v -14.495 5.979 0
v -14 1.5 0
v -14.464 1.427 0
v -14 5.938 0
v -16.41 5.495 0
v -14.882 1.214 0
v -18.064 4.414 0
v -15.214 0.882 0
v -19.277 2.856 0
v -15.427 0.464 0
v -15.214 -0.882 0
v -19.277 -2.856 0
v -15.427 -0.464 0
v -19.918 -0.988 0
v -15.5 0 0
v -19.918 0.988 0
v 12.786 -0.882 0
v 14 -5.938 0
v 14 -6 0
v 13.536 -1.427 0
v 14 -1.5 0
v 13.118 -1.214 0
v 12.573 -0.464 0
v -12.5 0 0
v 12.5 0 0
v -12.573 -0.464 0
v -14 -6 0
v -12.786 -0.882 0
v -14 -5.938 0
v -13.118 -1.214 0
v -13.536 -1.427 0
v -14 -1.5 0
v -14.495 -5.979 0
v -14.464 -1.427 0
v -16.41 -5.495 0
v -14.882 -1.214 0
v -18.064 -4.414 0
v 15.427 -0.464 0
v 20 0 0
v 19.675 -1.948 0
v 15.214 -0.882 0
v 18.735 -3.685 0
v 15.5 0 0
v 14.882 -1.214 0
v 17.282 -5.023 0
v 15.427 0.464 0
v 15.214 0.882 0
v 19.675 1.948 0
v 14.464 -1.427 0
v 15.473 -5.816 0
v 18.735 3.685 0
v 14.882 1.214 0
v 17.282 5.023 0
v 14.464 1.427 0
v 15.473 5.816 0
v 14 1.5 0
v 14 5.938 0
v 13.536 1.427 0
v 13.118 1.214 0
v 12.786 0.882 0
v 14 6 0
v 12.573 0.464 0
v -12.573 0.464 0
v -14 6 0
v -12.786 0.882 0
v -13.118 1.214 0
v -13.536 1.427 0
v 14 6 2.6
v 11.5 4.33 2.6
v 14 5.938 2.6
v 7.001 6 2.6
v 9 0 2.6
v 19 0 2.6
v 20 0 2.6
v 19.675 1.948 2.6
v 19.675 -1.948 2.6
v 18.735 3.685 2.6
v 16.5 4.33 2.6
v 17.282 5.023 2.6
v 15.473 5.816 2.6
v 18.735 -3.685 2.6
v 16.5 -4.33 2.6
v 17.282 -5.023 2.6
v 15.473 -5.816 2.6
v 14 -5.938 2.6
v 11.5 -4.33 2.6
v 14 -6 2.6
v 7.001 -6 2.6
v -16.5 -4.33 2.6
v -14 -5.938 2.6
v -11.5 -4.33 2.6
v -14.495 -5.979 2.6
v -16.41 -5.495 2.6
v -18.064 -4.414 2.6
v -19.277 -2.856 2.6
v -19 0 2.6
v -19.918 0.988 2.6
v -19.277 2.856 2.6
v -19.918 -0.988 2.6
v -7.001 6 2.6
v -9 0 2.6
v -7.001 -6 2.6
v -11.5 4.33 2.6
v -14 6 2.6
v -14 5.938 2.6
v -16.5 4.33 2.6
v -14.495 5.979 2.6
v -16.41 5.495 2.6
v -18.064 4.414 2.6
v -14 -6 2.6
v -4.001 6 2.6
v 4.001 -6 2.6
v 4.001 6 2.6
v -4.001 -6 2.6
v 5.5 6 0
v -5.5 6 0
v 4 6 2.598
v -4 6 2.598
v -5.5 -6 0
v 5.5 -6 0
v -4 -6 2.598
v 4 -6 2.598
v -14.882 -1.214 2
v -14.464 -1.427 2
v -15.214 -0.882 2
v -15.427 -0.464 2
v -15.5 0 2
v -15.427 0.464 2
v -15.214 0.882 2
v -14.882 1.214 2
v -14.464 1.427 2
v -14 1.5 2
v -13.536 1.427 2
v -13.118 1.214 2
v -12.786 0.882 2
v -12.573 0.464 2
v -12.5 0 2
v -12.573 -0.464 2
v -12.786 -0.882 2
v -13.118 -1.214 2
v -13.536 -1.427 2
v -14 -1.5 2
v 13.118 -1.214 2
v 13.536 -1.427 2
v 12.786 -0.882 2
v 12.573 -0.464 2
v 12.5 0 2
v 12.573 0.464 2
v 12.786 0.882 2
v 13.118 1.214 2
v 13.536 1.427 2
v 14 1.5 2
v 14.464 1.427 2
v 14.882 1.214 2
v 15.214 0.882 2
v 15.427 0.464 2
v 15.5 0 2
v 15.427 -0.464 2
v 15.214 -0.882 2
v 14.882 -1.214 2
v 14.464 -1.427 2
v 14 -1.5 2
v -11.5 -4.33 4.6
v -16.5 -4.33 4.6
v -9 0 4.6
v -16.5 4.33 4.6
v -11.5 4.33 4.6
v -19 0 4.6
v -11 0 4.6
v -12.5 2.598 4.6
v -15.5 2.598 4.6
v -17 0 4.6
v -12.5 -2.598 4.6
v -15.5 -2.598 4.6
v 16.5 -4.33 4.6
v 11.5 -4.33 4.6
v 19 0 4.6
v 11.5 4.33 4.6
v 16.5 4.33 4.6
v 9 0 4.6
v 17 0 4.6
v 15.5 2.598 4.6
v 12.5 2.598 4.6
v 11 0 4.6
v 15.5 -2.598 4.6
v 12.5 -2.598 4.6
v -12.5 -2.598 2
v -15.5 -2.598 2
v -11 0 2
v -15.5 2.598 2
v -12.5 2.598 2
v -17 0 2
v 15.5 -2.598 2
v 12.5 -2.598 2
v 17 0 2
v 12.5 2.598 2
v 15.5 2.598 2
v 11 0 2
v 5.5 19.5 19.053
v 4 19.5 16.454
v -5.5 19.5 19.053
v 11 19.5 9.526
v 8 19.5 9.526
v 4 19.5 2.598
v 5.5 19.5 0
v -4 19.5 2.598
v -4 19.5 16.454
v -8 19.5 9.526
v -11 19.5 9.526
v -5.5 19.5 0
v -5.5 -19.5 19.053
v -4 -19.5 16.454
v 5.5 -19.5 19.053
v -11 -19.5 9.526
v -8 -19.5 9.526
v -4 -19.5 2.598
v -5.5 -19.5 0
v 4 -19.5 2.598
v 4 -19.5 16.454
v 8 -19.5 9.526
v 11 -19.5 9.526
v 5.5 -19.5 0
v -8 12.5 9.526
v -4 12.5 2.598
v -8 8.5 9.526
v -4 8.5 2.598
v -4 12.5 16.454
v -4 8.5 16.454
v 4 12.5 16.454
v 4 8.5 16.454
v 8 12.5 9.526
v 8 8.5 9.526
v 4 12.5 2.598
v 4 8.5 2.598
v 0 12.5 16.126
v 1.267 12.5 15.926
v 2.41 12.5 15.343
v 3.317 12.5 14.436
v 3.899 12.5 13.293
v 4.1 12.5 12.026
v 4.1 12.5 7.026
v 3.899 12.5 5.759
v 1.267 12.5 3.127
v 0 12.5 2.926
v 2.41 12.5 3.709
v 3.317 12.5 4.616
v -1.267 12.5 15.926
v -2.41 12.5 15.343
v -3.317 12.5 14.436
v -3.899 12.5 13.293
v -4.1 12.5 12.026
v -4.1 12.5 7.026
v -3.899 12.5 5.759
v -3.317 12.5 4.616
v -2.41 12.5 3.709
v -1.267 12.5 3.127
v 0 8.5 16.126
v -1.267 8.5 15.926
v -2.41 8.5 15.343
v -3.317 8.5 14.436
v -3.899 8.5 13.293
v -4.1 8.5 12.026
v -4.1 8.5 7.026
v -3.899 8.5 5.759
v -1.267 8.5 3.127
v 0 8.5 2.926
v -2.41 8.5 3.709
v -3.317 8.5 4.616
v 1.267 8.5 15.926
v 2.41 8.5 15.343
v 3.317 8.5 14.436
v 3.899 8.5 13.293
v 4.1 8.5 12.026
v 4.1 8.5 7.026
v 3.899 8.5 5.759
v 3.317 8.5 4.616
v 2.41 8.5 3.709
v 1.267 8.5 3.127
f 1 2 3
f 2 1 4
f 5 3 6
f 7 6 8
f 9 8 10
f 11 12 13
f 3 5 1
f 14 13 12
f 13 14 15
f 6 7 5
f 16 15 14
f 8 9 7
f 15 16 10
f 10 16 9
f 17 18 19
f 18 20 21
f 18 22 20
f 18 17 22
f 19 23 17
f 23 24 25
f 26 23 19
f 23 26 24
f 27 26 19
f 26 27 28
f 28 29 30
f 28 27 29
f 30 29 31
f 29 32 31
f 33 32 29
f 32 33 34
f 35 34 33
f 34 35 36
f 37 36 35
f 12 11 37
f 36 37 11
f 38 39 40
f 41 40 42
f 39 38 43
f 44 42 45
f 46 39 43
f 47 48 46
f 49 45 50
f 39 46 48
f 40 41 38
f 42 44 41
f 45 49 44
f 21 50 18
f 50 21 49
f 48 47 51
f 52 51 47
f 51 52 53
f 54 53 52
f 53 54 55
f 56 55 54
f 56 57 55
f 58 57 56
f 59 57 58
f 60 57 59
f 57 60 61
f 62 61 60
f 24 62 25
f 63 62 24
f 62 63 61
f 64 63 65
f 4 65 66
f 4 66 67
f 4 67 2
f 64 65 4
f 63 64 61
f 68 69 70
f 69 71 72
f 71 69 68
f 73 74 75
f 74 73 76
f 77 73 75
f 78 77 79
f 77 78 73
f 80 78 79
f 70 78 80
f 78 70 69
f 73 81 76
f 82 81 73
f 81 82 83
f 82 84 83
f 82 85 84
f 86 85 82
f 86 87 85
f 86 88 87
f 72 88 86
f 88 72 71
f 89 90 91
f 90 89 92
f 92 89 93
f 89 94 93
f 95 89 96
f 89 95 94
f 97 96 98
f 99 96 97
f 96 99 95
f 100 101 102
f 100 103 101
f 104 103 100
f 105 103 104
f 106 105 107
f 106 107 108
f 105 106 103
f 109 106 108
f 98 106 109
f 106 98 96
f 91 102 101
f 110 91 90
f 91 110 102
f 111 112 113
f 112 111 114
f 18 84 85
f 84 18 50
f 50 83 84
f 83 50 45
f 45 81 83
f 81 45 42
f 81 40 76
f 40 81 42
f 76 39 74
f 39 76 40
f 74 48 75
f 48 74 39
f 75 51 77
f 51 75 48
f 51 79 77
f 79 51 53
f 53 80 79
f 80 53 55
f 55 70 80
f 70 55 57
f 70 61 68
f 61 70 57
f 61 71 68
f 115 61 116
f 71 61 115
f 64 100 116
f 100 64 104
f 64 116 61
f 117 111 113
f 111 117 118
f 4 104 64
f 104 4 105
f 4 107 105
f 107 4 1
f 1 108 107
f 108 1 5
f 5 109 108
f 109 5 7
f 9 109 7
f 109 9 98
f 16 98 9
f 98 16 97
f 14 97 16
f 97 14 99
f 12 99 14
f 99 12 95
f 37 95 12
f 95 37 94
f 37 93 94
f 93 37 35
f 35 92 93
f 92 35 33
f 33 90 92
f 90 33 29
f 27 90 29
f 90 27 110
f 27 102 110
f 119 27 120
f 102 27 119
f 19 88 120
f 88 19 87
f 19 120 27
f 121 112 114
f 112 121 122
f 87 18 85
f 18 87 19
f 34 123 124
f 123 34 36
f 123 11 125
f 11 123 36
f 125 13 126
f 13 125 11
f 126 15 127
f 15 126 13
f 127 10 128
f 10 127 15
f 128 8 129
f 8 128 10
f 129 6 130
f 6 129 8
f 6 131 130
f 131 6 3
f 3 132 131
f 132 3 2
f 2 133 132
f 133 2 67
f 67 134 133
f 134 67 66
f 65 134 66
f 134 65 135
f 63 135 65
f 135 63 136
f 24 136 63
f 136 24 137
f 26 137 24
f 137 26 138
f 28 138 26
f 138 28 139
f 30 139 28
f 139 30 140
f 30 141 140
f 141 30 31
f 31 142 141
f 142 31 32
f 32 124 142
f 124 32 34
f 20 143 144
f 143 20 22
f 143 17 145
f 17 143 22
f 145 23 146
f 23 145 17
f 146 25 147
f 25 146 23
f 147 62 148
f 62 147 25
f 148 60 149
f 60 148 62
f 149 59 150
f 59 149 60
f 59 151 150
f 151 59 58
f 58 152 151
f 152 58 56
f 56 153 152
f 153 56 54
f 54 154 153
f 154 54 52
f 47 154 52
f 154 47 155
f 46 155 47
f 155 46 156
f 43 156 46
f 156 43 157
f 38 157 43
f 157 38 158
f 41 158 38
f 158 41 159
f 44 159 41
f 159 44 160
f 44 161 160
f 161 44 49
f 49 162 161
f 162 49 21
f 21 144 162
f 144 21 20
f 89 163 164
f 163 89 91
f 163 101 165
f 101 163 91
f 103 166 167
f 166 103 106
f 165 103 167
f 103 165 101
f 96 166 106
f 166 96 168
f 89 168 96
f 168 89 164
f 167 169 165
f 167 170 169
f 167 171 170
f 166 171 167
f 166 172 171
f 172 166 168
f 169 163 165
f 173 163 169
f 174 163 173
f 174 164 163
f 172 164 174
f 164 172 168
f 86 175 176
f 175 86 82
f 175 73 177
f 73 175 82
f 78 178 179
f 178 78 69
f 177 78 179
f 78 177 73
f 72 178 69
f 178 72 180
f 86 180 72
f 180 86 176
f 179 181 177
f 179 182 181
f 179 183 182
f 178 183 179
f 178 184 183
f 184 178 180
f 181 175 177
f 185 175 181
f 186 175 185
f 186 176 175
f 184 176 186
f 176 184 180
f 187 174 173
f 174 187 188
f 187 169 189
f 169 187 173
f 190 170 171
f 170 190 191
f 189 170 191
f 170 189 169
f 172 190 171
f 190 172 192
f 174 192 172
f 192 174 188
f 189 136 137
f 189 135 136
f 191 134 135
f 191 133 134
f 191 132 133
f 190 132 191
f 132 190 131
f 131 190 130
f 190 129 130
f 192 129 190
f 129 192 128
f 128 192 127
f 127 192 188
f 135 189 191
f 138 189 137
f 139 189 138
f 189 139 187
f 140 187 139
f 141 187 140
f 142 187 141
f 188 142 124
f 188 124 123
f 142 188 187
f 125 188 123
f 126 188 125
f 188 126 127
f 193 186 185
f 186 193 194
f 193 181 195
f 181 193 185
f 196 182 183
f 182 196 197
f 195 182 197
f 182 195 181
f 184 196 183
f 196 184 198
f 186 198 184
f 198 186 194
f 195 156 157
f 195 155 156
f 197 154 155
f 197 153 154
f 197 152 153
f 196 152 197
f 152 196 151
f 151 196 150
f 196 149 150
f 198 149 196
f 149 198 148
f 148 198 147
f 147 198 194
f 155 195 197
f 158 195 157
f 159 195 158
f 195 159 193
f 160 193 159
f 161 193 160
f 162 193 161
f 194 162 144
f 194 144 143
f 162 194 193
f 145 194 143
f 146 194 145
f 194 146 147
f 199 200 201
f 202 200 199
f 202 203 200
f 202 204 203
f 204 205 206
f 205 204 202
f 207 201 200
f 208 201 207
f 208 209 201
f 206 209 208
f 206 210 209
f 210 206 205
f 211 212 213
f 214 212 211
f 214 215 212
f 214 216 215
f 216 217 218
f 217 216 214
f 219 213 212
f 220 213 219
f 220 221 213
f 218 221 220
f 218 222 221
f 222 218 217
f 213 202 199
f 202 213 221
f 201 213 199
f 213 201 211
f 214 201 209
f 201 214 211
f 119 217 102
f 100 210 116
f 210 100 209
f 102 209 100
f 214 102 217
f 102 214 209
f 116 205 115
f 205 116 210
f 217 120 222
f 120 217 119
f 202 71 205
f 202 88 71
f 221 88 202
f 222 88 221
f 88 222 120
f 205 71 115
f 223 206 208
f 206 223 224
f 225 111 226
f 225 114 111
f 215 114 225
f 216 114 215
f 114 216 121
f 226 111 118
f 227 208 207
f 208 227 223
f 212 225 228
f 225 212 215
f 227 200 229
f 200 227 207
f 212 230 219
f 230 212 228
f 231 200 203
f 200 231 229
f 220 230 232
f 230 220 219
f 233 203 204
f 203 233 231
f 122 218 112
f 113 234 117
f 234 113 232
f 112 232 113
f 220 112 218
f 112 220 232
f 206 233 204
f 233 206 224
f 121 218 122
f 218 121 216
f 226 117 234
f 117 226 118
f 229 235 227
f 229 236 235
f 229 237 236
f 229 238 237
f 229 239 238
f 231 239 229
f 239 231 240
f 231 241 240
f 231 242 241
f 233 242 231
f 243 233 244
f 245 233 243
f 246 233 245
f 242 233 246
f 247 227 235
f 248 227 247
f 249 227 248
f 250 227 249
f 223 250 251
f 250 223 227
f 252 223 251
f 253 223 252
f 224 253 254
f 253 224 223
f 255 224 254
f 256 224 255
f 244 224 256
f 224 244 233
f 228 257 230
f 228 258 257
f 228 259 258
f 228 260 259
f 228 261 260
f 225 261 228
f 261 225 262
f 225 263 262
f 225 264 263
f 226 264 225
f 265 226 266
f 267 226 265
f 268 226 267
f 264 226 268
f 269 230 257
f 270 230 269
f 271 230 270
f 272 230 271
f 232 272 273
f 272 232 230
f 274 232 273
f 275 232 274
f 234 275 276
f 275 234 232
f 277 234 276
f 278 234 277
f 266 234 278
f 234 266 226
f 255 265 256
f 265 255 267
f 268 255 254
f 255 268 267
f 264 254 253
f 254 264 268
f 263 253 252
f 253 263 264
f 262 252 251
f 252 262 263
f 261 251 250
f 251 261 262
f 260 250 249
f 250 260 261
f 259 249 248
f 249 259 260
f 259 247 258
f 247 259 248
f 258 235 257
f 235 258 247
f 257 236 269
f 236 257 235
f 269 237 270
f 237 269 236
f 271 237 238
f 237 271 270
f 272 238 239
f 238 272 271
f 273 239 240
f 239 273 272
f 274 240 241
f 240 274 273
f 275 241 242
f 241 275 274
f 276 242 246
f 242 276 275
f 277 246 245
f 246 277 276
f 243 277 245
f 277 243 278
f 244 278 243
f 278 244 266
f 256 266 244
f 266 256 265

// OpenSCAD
// z_threaded_bar_link (a.k.a. z-link)
//
// These are the plastic parts that link the XPlatform to the 
// Z-axis threaded bars.
//
// (c) 2013 Metamáquina <http://www.metamaquina.com.br> 
// Author: Felipe Corrêa da Silva Sanches <fsanches@metamaquina.com.br>
// Lincensed under the terms of the GNU General Public License
// version 3 or later.

//TODO: better names for these parameters
module z_threaded_bar_link (
    dx_z_threaded = 14,
    XPlatform_height = 45,
    thickness = 6,
    ZLink_rod_height = 11*sqrt(3)/2,
  	clearance = 0.2
  ){

  difference(){
    union(){
    linear_extrude(height=2.6){
	    difference(){
		    union(){
			    square([2*dx_z_threaded, 12], center=true);
			    translate([-dx_z_threaded, 0])
			    circle(r=6);
			    translate([dx_z_threaded, 0])
			    circle(r=6);
		    }
		    translate([-dx_z_threaded, 0])
		    circle(r=3/2, $fn=20);

		    translate([dx_z_threaded, 0])
		    circle(r=3/2, $fn=20);
	    }
    }
  		translate([-dx_z_threaded, 0, 2.6]) cylinder(r=5, h=2, $fn=6);
    	translate([dx_z_threaded, 0, 2.6]) cylinder(r=5, h=2, $fn=6);
    }

    translate([-dx_z_threaded, 0, 2]) cylinder(r=3, h=5, $fn=6);
    translate([dx_z_threaded, 0, 2]) cylinder(r=3, h=5, $fn=6);
  }

  translate([0,(XPlatform_height - thickness)/2, ZLink_rod_height])
  rotate([90, 0, 0]){
    linear_extrude(height=XPlatform_height - thickness)
    difference(){
	    circle($fn=6, r=11);
	    circle($fn=6, r=8);
    }

    translate([0,0,7]){
	    linear_extrude(height=4)
	    difference(){
		    circle($fn=6, r=10);
			hull(){
				for (i=[-1,1])
				translate([0,i*2.5])
			    circle($fn=20, r=(8+clearance)/2);
			}
	    }
    }
  }
}

z_threaded_bar_link();
